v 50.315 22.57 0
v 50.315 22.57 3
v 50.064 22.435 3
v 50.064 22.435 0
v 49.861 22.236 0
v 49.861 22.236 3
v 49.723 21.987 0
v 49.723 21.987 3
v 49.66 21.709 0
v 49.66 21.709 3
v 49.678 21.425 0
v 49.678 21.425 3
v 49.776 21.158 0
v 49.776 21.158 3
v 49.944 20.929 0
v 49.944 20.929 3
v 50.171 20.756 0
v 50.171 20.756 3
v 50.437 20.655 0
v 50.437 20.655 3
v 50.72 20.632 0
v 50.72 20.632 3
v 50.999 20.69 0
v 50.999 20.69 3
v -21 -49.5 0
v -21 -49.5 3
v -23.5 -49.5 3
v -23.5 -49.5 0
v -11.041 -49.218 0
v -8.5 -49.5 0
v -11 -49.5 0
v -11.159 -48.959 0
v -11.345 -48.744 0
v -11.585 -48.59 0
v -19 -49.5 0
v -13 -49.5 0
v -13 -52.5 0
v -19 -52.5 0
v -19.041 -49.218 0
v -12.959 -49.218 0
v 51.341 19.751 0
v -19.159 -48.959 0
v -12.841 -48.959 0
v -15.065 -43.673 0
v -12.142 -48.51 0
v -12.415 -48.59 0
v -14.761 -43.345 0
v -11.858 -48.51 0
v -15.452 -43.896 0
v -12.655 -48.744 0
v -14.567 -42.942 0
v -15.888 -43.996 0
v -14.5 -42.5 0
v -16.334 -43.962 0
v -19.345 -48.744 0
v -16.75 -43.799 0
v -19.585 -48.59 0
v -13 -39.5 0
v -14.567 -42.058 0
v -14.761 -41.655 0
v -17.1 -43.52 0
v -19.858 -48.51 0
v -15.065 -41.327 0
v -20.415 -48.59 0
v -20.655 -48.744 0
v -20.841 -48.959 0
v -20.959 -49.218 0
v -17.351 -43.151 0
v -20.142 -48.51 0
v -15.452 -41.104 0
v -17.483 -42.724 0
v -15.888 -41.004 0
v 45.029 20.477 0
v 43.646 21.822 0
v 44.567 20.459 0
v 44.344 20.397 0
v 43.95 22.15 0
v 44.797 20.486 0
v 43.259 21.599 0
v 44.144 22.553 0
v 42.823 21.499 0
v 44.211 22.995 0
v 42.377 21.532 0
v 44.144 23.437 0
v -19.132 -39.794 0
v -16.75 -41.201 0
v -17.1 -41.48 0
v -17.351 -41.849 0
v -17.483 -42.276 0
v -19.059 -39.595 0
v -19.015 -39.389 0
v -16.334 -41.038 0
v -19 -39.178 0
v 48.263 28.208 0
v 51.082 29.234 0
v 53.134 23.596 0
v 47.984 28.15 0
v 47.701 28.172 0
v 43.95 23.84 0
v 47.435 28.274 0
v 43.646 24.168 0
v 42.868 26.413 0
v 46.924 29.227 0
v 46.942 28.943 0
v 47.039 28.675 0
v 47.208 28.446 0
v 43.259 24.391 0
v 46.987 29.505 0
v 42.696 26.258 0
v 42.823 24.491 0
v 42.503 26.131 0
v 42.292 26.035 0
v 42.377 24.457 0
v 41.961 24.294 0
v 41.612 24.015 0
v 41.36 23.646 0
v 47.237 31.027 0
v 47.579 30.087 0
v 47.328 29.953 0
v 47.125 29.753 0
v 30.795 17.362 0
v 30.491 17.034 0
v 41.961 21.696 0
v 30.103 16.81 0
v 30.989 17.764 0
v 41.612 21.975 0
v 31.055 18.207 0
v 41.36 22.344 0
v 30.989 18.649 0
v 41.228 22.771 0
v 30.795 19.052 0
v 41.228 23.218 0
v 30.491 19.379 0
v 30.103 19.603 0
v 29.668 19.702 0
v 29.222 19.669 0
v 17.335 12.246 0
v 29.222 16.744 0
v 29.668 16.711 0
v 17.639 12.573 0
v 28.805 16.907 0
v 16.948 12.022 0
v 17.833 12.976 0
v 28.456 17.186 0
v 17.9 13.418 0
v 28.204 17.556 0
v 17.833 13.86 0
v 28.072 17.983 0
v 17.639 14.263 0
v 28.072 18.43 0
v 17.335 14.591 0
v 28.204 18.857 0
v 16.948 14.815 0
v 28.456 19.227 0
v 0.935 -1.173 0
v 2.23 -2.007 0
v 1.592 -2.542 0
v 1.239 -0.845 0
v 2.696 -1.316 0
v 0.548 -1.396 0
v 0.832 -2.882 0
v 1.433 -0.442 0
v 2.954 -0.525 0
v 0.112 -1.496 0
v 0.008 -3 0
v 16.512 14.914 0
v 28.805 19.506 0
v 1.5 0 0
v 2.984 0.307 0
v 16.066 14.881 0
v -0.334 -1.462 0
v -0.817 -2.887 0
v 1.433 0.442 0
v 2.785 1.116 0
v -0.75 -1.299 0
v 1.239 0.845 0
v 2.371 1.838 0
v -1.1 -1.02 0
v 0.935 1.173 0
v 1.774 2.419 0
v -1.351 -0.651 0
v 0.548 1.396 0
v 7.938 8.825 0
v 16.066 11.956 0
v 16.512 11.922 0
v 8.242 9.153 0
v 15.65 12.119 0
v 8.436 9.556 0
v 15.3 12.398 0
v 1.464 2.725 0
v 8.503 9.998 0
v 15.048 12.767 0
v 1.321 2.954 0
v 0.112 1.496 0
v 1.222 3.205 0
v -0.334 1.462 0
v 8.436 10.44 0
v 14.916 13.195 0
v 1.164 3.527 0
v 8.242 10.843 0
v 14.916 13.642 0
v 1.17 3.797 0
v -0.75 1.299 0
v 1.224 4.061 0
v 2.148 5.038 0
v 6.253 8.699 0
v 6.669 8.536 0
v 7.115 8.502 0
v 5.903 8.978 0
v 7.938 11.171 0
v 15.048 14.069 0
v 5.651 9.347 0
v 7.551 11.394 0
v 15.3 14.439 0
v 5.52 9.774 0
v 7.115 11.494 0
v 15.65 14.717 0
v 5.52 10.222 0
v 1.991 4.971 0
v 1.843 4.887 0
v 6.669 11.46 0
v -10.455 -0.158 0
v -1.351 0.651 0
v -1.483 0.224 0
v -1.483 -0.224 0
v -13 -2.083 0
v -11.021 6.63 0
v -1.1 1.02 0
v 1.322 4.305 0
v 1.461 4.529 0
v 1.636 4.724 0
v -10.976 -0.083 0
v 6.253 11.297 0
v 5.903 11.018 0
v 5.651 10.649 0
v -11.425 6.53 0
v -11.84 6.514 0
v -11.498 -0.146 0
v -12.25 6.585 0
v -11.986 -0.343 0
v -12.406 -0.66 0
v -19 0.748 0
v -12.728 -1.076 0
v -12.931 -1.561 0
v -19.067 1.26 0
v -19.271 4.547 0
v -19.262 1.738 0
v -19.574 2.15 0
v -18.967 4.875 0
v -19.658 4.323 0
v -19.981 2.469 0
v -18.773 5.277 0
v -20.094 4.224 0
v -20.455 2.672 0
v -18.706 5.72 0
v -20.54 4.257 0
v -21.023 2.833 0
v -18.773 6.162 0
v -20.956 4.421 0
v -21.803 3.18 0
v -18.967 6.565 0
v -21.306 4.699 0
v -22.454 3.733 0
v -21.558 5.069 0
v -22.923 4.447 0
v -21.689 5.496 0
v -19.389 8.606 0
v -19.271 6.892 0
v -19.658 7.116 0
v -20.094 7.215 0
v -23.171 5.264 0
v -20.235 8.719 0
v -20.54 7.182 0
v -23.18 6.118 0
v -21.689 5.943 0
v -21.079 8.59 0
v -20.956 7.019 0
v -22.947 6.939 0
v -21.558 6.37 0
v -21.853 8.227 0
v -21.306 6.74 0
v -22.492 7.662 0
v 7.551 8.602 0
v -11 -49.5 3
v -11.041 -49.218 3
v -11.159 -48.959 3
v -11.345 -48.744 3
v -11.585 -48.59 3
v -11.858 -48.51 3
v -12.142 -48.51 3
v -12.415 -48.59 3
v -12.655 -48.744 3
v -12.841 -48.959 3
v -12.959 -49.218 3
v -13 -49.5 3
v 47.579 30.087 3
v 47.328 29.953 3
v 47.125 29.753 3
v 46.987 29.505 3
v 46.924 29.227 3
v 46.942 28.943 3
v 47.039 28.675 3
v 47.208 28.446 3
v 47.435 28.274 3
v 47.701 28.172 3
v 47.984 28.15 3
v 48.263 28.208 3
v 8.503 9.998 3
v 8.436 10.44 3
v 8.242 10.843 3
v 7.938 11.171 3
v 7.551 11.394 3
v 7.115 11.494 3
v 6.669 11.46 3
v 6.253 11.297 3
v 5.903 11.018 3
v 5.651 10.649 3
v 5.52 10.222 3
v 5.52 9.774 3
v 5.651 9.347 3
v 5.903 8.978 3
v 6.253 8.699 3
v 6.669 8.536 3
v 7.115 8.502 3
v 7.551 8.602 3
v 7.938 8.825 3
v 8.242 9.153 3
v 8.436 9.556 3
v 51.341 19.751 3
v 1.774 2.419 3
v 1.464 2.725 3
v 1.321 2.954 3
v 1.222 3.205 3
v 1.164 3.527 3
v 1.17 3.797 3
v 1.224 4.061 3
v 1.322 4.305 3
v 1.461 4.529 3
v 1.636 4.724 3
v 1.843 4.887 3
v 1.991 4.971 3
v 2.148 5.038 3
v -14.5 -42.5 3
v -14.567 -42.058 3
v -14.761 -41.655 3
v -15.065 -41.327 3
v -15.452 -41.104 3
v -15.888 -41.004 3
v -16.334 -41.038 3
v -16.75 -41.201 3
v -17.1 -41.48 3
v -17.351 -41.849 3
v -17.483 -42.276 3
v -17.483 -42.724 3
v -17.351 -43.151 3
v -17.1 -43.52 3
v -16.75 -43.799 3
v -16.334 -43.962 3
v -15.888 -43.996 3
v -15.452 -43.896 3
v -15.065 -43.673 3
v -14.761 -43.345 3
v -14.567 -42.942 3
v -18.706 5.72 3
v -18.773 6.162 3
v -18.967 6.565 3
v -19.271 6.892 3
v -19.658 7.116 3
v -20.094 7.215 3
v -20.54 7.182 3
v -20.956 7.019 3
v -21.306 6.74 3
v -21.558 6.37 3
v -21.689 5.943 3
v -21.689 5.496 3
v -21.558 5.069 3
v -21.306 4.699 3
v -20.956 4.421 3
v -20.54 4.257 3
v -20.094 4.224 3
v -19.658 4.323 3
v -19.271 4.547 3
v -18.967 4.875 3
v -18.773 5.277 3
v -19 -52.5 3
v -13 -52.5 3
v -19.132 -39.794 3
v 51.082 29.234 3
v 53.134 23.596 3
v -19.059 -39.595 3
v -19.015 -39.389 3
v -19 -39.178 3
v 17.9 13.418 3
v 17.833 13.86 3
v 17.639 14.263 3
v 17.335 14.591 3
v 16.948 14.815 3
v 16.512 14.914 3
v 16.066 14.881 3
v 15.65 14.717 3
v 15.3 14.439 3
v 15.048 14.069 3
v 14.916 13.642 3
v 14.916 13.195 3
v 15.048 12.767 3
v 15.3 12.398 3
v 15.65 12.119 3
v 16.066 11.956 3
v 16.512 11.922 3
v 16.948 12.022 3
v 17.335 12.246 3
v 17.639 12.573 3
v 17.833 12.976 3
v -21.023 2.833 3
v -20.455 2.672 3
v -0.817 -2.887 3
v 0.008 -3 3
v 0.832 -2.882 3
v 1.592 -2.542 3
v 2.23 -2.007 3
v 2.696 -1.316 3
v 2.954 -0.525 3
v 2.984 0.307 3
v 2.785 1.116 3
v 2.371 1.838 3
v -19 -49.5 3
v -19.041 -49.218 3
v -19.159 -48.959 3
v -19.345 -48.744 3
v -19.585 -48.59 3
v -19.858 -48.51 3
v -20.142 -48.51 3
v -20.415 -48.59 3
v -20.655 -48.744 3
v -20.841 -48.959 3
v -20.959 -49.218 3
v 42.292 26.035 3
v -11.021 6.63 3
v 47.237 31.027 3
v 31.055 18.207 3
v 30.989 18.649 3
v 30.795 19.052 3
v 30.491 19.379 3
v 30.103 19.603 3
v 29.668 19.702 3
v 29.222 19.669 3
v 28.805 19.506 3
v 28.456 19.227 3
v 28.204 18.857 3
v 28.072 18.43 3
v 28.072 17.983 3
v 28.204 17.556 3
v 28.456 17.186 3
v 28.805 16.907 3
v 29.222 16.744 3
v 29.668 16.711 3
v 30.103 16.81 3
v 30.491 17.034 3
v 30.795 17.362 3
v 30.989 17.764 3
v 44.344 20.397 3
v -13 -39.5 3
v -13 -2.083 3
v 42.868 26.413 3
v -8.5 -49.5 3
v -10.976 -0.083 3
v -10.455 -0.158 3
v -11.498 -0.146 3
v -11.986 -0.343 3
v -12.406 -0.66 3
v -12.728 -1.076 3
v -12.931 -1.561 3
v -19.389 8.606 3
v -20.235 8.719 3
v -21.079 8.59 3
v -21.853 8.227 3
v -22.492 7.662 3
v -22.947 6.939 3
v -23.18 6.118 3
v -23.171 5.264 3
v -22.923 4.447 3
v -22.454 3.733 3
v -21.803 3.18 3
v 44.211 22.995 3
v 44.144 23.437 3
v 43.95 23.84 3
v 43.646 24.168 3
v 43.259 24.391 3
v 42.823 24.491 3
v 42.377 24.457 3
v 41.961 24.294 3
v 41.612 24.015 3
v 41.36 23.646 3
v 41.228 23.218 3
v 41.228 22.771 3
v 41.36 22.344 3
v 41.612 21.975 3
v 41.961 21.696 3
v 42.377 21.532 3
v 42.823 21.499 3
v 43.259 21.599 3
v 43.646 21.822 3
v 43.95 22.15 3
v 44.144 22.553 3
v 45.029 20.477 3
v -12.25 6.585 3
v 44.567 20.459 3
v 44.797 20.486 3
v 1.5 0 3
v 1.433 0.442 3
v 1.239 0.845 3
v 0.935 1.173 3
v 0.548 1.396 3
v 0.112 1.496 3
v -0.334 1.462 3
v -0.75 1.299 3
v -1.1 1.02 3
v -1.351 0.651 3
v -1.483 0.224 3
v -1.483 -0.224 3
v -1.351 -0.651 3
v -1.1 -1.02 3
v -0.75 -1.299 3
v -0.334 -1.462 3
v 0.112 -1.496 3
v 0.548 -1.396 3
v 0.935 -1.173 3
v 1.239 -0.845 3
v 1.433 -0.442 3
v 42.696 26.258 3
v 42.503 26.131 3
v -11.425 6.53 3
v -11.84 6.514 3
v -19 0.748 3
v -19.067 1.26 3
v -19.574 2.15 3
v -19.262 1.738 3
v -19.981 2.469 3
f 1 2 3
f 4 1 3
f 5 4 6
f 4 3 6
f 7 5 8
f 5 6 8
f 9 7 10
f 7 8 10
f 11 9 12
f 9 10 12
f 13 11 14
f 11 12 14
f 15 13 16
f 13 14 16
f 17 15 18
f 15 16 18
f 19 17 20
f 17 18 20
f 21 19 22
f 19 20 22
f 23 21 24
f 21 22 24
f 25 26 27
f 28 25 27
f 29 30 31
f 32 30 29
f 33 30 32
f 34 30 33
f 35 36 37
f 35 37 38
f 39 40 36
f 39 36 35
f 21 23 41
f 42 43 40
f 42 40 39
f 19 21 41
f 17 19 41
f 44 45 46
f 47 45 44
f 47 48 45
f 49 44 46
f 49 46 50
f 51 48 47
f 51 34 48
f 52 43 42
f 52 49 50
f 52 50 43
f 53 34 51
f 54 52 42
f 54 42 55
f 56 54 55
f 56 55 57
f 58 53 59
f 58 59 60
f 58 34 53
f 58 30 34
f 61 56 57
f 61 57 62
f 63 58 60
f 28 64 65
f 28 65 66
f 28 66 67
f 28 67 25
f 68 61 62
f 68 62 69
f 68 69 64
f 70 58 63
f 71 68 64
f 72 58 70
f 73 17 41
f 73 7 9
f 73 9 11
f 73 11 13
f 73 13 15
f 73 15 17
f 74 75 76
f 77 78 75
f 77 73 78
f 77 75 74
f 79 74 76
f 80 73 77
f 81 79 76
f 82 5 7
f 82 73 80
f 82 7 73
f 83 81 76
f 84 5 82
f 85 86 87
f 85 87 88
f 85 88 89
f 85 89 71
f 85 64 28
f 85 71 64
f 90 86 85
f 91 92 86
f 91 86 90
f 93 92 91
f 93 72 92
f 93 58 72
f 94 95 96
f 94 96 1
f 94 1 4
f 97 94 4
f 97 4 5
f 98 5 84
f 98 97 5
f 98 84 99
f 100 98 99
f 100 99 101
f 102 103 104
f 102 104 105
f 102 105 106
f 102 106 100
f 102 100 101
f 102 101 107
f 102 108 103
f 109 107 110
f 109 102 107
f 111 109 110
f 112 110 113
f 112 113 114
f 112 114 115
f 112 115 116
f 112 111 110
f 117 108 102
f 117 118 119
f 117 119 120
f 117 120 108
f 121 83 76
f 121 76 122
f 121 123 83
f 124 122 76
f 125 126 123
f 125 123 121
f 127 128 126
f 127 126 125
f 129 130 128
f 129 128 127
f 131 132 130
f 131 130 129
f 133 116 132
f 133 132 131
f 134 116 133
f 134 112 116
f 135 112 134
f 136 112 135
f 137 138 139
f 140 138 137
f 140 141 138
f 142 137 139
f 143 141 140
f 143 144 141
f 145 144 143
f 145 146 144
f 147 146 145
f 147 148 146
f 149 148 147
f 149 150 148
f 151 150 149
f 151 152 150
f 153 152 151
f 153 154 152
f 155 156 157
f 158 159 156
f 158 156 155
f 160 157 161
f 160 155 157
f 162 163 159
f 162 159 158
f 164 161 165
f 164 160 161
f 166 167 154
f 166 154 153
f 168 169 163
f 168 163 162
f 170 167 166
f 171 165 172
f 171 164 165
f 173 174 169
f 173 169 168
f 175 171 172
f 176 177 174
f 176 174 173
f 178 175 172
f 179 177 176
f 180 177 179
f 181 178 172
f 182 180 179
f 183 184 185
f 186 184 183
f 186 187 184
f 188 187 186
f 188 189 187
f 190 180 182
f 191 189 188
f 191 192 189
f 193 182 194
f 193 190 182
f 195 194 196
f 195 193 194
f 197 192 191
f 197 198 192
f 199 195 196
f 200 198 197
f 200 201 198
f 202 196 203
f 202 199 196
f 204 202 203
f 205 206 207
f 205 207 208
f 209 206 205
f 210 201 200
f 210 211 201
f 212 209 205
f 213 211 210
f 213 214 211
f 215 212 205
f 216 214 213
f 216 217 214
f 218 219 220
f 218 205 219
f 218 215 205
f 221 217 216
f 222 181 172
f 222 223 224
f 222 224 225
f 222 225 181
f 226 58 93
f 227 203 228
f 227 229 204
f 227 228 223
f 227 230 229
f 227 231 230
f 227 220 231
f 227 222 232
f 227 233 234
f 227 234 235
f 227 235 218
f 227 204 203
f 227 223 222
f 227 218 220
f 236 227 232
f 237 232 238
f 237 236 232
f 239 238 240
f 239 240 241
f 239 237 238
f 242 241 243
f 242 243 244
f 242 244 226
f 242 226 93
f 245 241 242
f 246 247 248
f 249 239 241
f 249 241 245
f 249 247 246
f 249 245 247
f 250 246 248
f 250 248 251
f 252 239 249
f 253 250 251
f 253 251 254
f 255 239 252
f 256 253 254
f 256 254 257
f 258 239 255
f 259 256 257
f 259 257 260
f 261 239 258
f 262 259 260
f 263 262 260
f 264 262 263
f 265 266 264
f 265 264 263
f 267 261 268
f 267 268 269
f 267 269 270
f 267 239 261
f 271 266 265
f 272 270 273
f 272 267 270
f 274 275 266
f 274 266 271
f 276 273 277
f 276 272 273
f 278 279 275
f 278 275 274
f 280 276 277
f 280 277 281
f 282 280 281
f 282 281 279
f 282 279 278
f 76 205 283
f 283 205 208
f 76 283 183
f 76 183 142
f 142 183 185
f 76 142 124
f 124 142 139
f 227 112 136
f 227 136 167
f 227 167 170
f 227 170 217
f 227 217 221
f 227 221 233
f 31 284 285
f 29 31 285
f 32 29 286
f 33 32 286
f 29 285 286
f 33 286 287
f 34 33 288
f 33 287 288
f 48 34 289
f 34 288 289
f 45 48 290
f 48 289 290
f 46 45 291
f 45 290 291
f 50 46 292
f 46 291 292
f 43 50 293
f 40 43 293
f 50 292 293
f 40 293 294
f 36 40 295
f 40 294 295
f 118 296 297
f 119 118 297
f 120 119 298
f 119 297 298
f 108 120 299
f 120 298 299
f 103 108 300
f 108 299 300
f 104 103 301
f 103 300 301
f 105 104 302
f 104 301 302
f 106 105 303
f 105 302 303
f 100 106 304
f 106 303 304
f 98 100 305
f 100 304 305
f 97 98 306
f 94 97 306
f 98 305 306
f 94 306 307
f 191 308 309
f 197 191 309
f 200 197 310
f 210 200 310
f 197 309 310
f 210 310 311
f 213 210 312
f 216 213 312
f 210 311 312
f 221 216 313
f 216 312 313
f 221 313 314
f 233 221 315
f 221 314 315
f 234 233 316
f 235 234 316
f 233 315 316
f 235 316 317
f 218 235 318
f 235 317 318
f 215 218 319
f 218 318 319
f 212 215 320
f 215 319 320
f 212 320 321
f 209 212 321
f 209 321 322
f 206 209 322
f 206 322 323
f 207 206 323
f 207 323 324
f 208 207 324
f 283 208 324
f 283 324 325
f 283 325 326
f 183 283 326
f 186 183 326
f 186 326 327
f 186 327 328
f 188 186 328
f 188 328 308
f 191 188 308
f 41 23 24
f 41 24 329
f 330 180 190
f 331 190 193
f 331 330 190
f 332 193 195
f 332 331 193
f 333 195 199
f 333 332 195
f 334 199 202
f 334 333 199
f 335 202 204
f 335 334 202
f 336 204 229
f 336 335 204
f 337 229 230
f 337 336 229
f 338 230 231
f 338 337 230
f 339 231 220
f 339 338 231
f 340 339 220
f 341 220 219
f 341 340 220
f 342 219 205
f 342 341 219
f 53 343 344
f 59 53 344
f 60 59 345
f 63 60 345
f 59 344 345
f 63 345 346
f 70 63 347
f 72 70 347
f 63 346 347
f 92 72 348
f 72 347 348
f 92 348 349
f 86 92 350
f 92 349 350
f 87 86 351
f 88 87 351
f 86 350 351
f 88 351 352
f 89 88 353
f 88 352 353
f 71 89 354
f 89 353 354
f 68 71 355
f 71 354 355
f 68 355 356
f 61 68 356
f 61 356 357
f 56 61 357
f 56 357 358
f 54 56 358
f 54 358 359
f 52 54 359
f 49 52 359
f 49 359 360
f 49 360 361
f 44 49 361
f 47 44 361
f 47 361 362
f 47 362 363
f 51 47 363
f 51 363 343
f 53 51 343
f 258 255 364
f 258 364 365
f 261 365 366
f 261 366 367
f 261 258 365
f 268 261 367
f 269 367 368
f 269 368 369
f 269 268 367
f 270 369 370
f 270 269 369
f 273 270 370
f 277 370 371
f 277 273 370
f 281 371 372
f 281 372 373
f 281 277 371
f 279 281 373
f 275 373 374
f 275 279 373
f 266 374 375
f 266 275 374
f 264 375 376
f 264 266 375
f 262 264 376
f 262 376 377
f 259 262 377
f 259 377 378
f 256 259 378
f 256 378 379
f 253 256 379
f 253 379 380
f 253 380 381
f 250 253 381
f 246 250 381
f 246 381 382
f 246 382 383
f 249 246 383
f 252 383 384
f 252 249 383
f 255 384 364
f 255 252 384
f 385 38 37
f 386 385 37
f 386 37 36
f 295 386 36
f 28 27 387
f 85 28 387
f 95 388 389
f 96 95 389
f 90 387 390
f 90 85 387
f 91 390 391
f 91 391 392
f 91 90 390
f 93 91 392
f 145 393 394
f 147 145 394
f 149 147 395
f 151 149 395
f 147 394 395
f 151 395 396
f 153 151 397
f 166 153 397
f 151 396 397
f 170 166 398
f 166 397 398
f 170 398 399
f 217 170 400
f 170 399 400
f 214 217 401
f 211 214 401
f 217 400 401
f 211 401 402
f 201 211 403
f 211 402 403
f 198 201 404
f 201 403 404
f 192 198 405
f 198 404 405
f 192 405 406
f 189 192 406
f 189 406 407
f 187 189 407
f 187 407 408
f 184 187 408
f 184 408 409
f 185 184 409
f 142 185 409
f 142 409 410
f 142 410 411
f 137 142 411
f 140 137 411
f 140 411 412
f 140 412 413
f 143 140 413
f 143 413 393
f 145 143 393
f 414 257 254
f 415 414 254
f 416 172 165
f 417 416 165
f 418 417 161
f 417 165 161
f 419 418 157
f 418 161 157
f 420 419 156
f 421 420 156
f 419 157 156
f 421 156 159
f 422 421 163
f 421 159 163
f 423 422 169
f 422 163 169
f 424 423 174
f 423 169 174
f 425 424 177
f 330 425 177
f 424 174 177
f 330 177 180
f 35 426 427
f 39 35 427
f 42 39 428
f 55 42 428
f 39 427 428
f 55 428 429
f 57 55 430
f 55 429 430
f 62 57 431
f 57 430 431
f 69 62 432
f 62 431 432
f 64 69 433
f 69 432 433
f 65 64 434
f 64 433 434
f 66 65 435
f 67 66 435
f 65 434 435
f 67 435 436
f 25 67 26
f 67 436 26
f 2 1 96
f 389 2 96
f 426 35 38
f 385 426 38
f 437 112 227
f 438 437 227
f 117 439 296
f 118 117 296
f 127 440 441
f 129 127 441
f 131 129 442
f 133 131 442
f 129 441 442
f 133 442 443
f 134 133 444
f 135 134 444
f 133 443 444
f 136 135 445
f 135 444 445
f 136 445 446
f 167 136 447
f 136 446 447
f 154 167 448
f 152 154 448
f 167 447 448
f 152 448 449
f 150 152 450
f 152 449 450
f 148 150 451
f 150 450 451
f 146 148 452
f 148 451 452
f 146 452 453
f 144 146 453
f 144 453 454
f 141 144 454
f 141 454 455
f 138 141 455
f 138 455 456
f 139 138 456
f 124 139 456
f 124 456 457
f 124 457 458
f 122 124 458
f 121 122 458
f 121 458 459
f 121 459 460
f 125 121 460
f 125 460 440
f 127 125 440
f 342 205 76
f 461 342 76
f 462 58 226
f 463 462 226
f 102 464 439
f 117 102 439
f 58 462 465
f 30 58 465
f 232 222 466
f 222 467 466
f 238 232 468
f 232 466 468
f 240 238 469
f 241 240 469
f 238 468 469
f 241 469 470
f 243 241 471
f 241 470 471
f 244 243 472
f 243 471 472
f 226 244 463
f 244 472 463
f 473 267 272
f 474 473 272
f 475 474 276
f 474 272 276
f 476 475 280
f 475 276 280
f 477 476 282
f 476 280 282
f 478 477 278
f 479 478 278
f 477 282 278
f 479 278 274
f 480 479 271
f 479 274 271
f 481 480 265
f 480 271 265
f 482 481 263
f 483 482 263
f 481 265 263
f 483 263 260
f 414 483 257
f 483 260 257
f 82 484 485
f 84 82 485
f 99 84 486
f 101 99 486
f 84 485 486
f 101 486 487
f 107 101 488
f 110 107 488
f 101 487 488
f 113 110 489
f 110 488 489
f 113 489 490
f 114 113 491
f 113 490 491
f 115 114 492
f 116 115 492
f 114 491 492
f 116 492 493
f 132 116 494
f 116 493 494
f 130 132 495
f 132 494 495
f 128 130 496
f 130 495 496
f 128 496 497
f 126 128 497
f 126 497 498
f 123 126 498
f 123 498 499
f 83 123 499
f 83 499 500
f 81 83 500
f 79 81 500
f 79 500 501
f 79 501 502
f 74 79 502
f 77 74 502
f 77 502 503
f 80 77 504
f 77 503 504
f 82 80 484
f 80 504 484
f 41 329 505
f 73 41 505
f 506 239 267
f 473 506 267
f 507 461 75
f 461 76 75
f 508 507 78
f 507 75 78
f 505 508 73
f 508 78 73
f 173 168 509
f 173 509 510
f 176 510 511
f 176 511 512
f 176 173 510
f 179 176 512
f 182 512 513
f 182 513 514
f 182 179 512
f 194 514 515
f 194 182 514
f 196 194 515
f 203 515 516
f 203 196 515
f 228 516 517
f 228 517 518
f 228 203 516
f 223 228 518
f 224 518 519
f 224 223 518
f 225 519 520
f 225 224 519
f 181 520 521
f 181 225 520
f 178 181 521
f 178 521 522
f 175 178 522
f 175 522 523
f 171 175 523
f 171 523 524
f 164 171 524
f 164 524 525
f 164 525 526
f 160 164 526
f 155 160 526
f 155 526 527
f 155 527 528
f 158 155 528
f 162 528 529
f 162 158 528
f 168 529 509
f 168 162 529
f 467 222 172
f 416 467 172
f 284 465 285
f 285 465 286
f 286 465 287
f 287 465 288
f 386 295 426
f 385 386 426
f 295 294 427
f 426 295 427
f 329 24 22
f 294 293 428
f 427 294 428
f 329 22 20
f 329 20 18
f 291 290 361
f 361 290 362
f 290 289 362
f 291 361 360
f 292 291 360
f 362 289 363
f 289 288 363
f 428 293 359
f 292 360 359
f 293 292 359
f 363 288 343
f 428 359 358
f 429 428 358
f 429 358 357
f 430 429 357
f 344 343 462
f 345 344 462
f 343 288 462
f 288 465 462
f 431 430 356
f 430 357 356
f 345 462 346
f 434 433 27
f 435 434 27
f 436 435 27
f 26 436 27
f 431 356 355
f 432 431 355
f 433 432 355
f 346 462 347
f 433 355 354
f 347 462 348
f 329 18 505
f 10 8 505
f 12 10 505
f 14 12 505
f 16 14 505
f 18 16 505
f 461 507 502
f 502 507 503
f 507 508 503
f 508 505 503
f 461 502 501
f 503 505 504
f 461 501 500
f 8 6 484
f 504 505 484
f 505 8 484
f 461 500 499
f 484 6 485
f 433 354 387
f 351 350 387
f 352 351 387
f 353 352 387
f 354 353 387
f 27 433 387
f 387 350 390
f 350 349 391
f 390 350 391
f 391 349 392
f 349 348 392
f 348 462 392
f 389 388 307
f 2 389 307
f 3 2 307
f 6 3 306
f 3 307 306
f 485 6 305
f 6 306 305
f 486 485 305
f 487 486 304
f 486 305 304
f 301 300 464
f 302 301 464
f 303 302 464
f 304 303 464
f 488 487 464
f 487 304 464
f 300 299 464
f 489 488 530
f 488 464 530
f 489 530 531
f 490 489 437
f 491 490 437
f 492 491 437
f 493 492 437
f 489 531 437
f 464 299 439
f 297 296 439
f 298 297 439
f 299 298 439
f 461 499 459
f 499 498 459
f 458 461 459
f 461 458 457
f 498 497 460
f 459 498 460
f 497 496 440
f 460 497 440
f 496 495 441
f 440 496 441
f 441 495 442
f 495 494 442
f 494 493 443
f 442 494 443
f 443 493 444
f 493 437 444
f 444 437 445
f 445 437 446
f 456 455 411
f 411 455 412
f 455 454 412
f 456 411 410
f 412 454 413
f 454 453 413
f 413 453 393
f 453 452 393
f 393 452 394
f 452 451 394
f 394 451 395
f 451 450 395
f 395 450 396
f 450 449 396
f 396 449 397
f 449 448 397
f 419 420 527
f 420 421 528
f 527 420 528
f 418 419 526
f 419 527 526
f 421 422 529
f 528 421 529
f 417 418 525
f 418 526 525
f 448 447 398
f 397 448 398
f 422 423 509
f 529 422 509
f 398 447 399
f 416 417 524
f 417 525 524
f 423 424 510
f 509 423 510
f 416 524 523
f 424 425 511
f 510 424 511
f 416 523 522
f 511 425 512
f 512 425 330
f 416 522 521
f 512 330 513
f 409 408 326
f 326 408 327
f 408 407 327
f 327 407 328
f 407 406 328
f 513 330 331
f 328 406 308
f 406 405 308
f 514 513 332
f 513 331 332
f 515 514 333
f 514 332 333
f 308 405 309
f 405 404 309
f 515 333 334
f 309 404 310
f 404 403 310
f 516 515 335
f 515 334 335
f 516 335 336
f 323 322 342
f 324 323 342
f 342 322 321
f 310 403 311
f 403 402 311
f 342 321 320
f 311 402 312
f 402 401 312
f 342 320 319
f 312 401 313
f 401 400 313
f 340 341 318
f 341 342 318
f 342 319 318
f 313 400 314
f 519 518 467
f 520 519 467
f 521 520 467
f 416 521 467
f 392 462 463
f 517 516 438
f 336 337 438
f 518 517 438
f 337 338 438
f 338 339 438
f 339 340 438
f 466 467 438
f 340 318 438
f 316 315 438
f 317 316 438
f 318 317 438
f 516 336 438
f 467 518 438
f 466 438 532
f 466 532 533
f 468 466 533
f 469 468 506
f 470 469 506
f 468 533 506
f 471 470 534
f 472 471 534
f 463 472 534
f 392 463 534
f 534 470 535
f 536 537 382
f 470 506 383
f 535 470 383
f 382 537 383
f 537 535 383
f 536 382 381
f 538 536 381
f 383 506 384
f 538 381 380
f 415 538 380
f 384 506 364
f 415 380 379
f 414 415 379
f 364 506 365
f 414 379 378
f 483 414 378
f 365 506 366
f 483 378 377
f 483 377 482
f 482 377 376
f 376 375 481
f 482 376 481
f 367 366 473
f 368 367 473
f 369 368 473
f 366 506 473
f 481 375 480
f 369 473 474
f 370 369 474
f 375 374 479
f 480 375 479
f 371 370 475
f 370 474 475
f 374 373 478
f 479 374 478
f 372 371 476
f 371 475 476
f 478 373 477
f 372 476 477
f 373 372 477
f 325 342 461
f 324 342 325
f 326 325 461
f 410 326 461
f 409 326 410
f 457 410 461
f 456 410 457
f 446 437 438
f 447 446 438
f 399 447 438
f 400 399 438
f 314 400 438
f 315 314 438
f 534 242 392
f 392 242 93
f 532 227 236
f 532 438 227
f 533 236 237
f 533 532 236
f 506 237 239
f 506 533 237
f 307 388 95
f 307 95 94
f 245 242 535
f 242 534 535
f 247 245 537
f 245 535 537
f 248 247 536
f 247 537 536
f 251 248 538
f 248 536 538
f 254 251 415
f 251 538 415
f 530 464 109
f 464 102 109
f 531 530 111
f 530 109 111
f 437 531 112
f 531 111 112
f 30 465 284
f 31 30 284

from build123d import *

# Parameters (mm, degrees)
SKETCH_1_R          = 1.5
EXTRUDE_1_DEPTH     = 3
FILLET_1_R          = 2
FILLET_2_R          = 1.5
EXTRUDE_2_DEPTH     = 3
CUT_EXTRUDE_2_DEPTH = 10
EXTRUDE_3_DEPTH     = 3
FILLET_4_R          = 1.5
SKETCH_8_R          = 1.5
CUT_EXTRUDE_3_DEPTH = 3
SKETCH_9_R          = 1
CUT_EXTRUDE_4_DEPTH = 10
SKETCH_10_R         = 1.5
CUT_EXTRUDE_5_DEPTH = 10
SKETCH_11_R         = 1.5
CUT_EXTRUDE_6_DEPTH = 75.756148202


with BuildPart() as part:
    # 草图1 → 凸台-拉伸1 (new body)
    with BuildSketch(Plane.XY):
        with BuildLine():
            ThreePointArc((-0.817087424, -2.886584165), (2.886584165, -0.817087424), (0.817087424, 2.886584165))
            Line((0.817087424, 2.886584165), (-1.760091504, 3.616090173))
            Line((-1.760091504, 3.616090173), (64.410402882, 27.700180516))
            Line((64.410402882, 27.700180516), (62.358282022, 33.338336241))
            Line((62.358282022, 33.338336241), (-11.628300128, 6.409422603))
            Line((-11.628300128, 6.409422603), (-19.389001732, 8.606196131))
            ThreePointArc((-19.389001732, 8.606196131), (-23.09267332, 6.53669939), (-21.023176579, 2.833027801))
            Line((-21.023176579, 2.833027801), (-19, 2.260339792))
            Line((-19, 2.260339792), (-19, -52.5))
            Line((-19, -52.5), (-13, -52.5))
            Line((-13, -52.5), (-13, 0.561957115))
            Line((-13, 0.561957115), (-0.817087424, -2.886584165))
        make_face()
        with Locations((-20.206089155, 5.719611966)):
            Circle(SKETCH_1_R, mode=Mode.SUBTRACT)
        Circle(SKETCH_1_R, mode=Mode.SUBTRACT)
    extrude(amount=EXTRUDE_1_DEPTH)

    # 圆角1
    fillet_1_edges = [part.edges().sort_by_distance(p)[0] for p in [
        (-11.628300128, 6.409422603, 1.5),
        (-13, 0.561957115, 1.5),
        (-19, 2.260339792, 1.5),
    ]]
    fillet(fillet_1_edges, radius=FILLET_1_R)

    # 圆角2
    fillet_2_edges = [part.edges().sort_by_distance(p)[0] for p in [
        (-1.760091504, 3.616090173, 1.5),
    ]]
    fillet(fillet_2_edges, radius=FILLET_2_R)

    # 草图3 → 凸台-拉伸2 (add)
    with BuildSketch(Plane.XY.offset(3)):
        with BuildLine():
            Line((-21, -49.5), (-23.5, -49.5))
            Line((-23.5, -49.5), (-19, -39.5))
            Line((-19, -39.5), (-19, -49.5))
            ThreePointArc((-19, -49.5), (-20, -48.5), (-21, -49.5))
        make_face()
        with BuildLine():
            Line((-13, -49.5), (-13, -39.5))
            Line((-13, -39.5), (-8.5, -49.5))
            Line((-8.5, -49.5), (-11, -49.5))
            ThreePointArc((-11, -49.5), (-12, -48.5), (-13, -49.5))
        make_face()
    extrude(amount=-EXTRUDE_2_DEPTH)

    # 草图7 → 切除-拉伸2 (cut)
    with BuildSketch(Plane.XY.offset(3)):
        Polygon((53.134091432, 23.595938796), (64.410402882, 27.700180516), (62.358282022, 33.338336241), (51.081970572, 29.234094521), align=None)
    extrude(amount=-CUT_EXTRUDE_2_DEPTH, mode=Mode.SUBTRACT)

    # 草图4 → 凸台-拉伸3 (add)
    with BuildSketch(Plane.XY.offset(3)):
        Polygon((42.624736985, 26.155913231), (47.23683228, 31.027111953), (48.26289271, 28.208034091), (51.081970572, 29.234094521), (53.134091432, 23.595938796), (50.31501357, 22.569878366), (51.341074, 19.750800504), (44.676857845, 20.517757506), align=None)
    extrude(amount=-EXTRUDE_3_DEPTH)

    # 圆角4
    fillet_4_edges = [part.edges().sort_by_distance(p)[0] for p in [
        (44.676857845, 20.517757506, 1.5),
        (42.624736985, 26.155913231, 1.5),
        (-19, -39.5, 1.5),
    ]]
    fillet(fillet_4_edges, radius=FILLET_4_R)

    # 草图8 → 切除-拉伸3 (cut)
    with BuildSketch(Plane.XY.offset(3)):
        with Locations((42.711104794, 22.994815225)):
            Circle(SKETCH_8_R)
    extrude(amount=-CUT_EXTRUDE_3_DEPTH, mode=Mode.SUBTRACT)

    # 草图9 → 切除-拉伸4 (cut)
    with BuildSketch(Plane.XY.offset(3)):
        with Locations((47.920872567, 29.147726712)):
            Circle(SKETCH_9_R)
        with Locations((50.657033713, 21.630185745)):
            Circle(SKETCH_9_R)
    extrude(amount=-CUT_EXTRUDE_4_DEPTH, mode=Mode.SUBTRACT)

    # 草图10 → 切除-拉伸5 (cut)
    with BuildSketch(Plane.XY.offset(3)):
        with Locations((-16, -42.5)):
            Circle(SKETCH_10_R)
    extrude(amount=-CUT_EXTRUDE_5_DEPTH, mode=Mode.SUBTRACT)

    # 草图11 → 切除-拉伸6 (cut, through all)
    with BuildSketch(Plane.XY.offset(3)):
        with Locations((16.399711412, 13.418251212)):
            Circle(SKETCH_11_R)
        with Locations((7.002785205, 9.998049779)):
            Circle(SKETCH_11_R)
        with Locations((29.555408103, 18.206533219)):
            Circle(SKETCH_11_R)
    extrude(amount=-CUT_EXTRUDE_6_DEPTH, mode=Mode.SUBTRACT)


solid = part.part
